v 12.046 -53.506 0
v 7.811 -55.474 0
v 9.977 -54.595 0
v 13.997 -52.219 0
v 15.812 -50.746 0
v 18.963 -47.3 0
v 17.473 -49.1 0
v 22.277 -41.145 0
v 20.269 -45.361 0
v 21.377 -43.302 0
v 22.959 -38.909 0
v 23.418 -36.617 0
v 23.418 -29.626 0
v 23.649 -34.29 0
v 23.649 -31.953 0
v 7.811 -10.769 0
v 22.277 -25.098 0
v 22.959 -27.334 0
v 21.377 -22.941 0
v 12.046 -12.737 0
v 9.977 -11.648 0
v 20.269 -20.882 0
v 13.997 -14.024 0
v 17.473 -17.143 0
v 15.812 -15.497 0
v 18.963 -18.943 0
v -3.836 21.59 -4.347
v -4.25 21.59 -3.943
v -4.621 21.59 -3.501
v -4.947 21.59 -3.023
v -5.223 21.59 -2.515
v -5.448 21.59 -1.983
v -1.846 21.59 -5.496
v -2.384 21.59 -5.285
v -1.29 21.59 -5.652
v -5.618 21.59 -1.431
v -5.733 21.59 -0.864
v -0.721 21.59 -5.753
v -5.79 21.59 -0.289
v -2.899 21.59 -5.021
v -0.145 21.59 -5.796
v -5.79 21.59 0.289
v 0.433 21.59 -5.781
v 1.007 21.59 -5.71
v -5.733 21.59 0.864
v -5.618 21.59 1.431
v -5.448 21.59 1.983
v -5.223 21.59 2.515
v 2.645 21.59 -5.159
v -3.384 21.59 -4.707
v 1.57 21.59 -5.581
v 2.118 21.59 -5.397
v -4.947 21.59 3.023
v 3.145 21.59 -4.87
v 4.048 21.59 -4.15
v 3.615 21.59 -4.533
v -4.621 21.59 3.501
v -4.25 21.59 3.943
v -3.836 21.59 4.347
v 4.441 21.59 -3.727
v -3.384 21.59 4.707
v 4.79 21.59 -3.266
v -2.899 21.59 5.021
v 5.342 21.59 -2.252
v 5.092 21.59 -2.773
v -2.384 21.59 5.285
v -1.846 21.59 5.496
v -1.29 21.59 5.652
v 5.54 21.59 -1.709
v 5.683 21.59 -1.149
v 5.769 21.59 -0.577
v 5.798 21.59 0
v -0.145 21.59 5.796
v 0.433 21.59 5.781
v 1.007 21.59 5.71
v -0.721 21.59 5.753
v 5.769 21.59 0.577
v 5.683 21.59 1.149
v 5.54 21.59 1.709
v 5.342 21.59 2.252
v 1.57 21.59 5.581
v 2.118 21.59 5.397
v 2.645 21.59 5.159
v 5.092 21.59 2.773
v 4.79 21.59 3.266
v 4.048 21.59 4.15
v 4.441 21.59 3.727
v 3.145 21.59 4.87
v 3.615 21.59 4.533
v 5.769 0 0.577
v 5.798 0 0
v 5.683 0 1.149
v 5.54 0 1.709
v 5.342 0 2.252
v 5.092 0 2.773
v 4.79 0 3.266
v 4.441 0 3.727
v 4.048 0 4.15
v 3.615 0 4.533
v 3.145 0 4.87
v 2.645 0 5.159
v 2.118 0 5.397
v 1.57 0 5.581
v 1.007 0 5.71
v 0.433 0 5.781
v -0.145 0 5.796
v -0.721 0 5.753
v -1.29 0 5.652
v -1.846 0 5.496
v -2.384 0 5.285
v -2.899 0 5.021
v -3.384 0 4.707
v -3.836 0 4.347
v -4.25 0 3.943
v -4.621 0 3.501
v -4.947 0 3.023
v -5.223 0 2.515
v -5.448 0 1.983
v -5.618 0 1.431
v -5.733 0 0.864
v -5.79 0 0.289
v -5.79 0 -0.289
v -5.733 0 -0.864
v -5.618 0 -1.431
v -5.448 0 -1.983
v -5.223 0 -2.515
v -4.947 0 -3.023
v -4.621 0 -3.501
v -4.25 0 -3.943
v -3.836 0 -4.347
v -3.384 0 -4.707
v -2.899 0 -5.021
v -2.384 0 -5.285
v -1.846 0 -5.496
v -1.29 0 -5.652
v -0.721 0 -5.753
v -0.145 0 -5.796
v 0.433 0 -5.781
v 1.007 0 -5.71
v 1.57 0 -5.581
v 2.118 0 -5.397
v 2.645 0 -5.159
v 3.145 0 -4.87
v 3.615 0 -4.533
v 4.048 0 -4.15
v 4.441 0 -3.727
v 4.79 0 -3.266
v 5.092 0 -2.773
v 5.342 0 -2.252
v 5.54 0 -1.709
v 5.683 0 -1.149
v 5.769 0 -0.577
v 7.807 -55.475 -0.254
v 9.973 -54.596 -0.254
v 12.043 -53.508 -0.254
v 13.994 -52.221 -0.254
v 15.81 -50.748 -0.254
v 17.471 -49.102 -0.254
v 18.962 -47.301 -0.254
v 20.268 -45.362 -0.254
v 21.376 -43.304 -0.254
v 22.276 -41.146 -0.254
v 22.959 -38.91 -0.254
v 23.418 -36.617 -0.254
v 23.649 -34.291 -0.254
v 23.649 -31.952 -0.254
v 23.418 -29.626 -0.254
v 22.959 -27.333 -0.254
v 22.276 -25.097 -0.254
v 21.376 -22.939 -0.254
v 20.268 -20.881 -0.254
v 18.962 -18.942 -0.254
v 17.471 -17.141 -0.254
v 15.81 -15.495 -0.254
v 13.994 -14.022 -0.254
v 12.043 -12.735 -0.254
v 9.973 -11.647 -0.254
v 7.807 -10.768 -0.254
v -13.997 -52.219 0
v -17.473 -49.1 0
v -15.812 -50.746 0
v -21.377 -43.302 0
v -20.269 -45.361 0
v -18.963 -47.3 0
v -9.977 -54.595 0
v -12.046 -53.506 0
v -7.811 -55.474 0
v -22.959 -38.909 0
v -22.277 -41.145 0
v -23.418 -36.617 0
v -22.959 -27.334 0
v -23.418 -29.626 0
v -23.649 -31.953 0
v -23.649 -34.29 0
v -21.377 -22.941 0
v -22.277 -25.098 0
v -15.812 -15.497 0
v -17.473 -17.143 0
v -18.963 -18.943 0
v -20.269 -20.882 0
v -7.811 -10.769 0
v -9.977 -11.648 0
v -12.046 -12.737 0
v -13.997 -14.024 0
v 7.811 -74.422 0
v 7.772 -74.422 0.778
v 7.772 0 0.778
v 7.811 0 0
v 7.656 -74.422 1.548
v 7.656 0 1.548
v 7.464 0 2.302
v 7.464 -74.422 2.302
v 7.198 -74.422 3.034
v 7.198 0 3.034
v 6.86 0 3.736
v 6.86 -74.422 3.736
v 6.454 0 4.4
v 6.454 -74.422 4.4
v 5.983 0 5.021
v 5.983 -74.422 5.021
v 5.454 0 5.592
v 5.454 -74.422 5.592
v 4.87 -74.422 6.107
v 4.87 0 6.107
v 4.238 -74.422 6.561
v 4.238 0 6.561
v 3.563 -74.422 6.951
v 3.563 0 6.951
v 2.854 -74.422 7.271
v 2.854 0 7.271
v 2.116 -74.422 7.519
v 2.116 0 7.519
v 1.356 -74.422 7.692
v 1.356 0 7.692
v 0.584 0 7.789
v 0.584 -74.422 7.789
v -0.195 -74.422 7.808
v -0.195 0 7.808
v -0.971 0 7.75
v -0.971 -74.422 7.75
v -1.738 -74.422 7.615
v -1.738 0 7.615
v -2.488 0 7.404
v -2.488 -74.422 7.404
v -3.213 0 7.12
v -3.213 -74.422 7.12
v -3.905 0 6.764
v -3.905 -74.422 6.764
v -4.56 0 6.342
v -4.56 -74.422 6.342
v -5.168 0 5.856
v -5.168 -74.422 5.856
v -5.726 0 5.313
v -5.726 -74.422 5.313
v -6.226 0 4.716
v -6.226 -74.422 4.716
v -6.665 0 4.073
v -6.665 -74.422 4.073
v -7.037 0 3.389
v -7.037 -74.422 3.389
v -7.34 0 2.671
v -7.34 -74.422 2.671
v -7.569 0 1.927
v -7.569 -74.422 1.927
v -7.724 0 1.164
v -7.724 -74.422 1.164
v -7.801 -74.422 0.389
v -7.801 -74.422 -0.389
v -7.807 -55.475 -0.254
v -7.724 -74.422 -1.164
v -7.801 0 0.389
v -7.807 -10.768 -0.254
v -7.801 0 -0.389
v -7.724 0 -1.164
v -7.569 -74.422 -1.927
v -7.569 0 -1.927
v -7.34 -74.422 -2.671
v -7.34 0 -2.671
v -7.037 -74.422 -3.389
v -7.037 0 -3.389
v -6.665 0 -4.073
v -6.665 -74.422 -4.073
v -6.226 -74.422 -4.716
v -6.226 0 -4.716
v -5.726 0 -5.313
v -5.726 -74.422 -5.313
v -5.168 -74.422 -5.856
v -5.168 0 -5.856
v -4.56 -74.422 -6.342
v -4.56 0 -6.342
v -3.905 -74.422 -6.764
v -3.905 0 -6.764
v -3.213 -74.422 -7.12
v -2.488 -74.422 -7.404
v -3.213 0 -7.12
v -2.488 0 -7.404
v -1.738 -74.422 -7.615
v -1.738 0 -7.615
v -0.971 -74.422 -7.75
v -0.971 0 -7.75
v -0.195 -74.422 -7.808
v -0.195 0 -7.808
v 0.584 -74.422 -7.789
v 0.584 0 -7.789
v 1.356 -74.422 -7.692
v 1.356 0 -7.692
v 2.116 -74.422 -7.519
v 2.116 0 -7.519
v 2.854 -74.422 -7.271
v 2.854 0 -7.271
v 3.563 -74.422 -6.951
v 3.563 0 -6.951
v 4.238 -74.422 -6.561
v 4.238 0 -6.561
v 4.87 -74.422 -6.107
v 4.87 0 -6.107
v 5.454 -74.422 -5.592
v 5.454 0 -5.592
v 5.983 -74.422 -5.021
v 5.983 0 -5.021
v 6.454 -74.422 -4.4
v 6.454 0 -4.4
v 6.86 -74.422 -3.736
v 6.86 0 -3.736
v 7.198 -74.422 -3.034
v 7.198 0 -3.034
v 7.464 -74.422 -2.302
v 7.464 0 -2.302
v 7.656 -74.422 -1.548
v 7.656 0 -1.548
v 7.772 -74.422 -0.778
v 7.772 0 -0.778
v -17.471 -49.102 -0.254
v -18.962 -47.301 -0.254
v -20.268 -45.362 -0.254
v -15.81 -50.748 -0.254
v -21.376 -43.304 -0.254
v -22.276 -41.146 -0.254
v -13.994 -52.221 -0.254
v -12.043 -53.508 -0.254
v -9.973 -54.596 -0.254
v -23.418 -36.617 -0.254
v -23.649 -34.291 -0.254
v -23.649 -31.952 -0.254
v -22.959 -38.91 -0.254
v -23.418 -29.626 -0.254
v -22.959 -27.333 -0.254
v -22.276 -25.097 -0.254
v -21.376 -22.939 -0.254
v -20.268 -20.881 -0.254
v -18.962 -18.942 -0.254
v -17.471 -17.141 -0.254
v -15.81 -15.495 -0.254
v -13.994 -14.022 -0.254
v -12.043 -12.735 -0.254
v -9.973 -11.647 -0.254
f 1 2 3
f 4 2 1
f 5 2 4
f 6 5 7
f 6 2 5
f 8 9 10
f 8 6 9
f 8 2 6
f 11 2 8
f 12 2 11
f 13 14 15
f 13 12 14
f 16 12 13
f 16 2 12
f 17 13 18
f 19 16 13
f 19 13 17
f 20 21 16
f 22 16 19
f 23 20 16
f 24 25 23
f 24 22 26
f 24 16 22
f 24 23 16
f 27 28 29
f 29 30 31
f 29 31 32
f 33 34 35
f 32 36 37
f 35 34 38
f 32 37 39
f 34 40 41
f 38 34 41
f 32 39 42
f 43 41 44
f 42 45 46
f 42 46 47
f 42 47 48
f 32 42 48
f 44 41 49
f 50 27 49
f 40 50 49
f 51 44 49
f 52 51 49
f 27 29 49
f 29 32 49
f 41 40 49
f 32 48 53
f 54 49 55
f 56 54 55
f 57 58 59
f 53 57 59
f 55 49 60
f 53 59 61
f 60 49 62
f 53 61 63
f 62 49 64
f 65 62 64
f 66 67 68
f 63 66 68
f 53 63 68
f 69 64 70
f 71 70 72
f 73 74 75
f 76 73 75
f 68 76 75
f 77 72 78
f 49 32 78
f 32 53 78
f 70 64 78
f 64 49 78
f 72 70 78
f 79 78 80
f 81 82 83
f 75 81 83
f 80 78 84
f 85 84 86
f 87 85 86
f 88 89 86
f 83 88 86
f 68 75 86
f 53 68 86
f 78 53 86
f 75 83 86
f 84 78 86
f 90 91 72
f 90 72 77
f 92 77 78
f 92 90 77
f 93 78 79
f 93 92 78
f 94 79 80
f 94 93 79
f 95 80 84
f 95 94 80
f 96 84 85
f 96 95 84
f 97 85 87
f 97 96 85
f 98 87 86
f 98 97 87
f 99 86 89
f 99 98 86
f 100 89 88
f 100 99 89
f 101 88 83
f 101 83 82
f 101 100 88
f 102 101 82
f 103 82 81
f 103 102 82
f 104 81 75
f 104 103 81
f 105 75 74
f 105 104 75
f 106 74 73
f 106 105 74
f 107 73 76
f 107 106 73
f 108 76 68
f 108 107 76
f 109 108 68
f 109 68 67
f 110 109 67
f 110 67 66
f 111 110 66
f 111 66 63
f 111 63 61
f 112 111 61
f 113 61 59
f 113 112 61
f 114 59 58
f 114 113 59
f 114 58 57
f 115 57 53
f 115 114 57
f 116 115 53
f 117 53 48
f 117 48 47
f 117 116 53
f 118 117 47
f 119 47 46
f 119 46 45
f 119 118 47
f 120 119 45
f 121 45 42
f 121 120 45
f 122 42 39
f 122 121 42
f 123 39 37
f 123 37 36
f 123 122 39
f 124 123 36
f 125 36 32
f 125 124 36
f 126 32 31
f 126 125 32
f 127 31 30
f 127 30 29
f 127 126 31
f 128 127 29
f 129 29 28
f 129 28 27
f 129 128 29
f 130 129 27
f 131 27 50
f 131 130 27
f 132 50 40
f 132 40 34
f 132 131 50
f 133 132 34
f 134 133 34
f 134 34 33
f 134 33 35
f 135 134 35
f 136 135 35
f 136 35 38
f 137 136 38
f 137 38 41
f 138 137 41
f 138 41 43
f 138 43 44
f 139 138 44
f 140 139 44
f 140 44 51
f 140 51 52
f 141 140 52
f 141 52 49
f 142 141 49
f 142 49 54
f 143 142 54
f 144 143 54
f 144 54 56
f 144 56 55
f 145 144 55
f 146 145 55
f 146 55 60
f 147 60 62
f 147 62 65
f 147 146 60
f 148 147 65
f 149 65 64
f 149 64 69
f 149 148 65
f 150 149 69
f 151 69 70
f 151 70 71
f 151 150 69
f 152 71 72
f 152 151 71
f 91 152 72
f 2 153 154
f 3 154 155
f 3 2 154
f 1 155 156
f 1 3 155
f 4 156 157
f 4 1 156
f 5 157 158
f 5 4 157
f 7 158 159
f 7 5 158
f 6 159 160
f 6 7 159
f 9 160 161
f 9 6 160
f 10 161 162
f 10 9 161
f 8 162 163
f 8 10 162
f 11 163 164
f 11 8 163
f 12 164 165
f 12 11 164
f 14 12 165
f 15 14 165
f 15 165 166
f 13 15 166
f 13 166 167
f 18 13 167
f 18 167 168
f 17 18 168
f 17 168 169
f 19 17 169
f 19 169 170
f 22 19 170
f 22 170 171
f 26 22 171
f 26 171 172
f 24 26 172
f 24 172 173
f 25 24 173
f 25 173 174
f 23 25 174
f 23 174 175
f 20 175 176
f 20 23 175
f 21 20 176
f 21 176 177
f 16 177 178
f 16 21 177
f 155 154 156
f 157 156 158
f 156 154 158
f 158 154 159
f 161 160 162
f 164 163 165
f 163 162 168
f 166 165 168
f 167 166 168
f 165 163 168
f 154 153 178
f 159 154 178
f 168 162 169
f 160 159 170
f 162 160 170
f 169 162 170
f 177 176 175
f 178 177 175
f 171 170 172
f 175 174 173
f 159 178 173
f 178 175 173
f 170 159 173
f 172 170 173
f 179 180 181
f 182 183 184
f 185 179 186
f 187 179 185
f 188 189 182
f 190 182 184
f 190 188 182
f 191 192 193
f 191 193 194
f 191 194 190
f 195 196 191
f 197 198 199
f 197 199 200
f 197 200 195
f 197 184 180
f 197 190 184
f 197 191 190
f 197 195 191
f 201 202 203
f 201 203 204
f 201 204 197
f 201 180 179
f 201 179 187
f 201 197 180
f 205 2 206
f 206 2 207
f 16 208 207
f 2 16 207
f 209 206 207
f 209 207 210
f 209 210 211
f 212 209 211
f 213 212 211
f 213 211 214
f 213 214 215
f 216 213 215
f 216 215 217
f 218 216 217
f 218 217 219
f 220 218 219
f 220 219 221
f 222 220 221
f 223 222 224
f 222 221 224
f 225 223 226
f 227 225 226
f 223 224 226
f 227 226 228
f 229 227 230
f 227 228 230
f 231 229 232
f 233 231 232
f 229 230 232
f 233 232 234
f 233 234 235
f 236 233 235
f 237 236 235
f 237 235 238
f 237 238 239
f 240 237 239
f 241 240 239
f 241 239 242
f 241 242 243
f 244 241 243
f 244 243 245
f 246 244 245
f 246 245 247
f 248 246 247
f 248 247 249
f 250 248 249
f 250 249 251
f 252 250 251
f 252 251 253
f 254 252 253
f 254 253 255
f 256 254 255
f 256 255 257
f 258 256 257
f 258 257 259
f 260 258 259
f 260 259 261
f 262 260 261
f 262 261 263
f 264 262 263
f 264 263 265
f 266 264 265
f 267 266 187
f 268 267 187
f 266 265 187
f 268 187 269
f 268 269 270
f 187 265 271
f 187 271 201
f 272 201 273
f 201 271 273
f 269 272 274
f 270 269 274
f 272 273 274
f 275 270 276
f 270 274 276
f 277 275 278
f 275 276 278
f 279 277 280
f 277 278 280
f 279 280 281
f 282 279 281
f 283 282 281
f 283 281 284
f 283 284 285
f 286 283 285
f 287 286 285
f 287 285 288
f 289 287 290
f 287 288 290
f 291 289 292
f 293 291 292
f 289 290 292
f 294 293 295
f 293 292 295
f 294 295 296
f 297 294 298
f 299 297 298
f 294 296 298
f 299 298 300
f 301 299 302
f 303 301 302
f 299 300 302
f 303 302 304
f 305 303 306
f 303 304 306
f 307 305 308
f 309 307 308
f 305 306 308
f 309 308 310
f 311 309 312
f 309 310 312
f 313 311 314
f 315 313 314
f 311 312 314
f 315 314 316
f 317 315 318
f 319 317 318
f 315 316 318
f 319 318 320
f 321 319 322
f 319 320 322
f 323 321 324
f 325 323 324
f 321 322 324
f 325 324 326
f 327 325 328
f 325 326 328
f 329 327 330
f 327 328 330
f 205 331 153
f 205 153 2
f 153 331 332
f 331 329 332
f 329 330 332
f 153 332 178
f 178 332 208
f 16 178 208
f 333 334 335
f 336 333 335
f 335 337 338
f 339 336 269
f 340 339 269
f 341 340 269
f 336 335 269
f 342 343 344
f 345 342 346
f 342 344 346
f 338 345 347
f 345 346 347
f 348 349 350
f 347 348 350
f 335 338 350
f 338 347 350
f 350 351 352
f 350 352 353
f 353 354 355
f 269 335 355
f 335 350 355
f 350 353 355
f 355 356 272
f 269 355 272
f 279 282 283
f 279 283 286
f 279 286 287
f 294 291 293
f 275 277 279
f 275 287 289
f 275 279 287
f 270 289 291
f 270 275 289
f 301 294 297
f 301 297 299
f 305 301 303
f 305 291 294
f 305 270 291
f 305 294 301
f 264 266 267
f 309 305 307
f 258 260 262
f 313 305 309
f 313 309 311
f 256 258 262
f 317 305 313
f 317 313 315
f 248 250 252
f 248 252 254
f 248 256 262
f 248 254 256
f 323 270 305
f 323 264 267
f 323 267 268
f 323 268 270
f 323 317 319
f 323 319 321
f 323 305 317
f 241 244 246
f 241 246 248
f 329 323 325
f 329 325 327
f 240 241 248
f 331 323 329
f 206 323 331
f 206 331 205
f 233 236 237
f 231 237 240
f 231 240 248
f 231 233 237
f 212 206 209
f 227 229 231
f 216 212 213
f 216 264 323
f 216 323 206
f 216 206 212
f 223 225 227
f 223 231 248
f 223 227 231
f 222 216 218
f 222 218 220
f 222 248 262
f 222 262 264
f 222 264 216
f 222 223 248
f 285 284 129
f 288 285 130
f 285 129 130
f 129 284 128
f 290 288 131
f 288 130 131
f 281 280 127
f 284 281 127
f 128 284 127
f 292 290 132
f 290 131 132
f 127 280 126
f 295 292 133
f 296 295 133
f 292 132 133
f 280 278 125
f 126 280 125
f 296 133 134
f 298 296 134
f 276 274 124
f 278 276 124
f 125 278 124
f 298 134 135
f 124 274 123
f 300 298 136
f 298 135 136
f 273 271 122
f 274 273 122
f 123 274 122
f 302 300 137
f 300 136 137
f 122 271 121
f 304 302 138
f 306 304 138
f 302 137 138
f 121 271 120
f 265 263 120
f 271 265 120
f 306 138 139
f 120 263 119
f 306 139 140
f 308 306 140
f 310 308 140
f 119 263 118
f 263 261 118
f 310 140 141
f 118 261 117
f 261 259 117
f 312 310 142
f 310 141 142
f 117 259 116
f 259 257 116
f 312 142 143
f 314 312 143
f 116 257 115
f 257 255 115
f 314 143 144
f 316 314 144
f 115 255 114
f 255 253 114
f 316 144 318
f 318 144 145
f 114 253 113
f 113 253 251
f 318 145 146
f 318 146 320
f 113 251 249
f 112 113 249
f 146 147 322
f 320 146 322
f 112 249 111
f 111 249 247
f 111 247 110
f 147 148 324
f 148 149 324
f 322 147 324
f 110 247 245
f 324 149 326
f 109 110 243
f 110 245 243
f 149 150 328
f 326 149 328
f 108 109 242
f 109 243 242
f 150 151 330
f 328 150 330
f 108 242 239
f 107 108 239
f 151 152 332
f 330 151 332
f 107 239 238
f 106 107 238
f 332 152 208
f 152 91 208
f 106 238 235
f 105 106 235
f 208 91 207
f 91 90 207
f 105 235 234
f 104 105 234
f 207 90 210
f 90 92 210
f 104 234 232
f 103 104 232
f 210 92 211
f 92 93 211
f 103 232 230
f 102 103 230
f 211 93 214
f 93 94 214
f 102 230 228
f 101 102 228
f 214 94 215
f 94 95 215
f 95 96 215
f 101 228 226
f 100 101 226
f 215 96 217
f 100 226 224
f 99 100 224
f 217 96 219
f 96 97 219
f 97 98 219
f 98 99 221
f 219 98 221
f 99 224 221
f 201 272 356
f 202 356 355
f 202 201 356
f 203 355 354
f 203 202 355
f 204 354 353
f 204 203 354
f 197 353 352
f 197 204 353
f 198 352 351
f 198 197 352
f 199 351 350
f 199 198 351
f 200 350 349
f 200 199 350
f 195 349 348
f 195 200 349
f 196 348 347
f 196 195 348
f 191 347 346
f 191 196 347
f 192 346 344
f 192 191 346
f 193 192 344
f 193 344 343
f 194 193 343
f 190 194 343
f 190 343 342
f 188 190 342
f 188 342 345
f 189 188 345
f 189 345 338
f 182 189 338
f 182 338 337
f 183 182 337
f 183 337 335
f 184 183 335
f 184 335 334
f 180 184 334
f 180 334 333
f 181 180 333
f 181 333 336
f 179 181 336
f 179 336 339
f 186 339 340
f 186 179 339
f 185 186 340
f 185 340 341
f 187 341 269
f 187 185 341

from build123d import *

# Parameters (mm, degrees)
F0_R     = 7.810875
F1_DEPTH = 74.422
F2_R     = 5.797625
F3_DEPTH = 21.59
F4_R     = 23.677635
F5_DEPTH = 0.254


with BuildPart() as f1:
    # F0 (on Front) → F1 (new body)
    with BuildSketch(Plane.XZ):
        Circle(F0_R)
    extrude(amount=F1_DEPTH)

    # F2 (on Front) → F3 (join)
    with BuildSketch(Plane.XZ):
        Circle(F2_R)
    extrude(amount=-F3_DEPTH)

    # F4 (on Top) → F5 (join)
    with BuildSketch(Plane.XY):
        with Locations((0, -33.121504)):
            Circle(F4_R)
    extrude(amount=-F5_DEPTH)


solid = f1.part
